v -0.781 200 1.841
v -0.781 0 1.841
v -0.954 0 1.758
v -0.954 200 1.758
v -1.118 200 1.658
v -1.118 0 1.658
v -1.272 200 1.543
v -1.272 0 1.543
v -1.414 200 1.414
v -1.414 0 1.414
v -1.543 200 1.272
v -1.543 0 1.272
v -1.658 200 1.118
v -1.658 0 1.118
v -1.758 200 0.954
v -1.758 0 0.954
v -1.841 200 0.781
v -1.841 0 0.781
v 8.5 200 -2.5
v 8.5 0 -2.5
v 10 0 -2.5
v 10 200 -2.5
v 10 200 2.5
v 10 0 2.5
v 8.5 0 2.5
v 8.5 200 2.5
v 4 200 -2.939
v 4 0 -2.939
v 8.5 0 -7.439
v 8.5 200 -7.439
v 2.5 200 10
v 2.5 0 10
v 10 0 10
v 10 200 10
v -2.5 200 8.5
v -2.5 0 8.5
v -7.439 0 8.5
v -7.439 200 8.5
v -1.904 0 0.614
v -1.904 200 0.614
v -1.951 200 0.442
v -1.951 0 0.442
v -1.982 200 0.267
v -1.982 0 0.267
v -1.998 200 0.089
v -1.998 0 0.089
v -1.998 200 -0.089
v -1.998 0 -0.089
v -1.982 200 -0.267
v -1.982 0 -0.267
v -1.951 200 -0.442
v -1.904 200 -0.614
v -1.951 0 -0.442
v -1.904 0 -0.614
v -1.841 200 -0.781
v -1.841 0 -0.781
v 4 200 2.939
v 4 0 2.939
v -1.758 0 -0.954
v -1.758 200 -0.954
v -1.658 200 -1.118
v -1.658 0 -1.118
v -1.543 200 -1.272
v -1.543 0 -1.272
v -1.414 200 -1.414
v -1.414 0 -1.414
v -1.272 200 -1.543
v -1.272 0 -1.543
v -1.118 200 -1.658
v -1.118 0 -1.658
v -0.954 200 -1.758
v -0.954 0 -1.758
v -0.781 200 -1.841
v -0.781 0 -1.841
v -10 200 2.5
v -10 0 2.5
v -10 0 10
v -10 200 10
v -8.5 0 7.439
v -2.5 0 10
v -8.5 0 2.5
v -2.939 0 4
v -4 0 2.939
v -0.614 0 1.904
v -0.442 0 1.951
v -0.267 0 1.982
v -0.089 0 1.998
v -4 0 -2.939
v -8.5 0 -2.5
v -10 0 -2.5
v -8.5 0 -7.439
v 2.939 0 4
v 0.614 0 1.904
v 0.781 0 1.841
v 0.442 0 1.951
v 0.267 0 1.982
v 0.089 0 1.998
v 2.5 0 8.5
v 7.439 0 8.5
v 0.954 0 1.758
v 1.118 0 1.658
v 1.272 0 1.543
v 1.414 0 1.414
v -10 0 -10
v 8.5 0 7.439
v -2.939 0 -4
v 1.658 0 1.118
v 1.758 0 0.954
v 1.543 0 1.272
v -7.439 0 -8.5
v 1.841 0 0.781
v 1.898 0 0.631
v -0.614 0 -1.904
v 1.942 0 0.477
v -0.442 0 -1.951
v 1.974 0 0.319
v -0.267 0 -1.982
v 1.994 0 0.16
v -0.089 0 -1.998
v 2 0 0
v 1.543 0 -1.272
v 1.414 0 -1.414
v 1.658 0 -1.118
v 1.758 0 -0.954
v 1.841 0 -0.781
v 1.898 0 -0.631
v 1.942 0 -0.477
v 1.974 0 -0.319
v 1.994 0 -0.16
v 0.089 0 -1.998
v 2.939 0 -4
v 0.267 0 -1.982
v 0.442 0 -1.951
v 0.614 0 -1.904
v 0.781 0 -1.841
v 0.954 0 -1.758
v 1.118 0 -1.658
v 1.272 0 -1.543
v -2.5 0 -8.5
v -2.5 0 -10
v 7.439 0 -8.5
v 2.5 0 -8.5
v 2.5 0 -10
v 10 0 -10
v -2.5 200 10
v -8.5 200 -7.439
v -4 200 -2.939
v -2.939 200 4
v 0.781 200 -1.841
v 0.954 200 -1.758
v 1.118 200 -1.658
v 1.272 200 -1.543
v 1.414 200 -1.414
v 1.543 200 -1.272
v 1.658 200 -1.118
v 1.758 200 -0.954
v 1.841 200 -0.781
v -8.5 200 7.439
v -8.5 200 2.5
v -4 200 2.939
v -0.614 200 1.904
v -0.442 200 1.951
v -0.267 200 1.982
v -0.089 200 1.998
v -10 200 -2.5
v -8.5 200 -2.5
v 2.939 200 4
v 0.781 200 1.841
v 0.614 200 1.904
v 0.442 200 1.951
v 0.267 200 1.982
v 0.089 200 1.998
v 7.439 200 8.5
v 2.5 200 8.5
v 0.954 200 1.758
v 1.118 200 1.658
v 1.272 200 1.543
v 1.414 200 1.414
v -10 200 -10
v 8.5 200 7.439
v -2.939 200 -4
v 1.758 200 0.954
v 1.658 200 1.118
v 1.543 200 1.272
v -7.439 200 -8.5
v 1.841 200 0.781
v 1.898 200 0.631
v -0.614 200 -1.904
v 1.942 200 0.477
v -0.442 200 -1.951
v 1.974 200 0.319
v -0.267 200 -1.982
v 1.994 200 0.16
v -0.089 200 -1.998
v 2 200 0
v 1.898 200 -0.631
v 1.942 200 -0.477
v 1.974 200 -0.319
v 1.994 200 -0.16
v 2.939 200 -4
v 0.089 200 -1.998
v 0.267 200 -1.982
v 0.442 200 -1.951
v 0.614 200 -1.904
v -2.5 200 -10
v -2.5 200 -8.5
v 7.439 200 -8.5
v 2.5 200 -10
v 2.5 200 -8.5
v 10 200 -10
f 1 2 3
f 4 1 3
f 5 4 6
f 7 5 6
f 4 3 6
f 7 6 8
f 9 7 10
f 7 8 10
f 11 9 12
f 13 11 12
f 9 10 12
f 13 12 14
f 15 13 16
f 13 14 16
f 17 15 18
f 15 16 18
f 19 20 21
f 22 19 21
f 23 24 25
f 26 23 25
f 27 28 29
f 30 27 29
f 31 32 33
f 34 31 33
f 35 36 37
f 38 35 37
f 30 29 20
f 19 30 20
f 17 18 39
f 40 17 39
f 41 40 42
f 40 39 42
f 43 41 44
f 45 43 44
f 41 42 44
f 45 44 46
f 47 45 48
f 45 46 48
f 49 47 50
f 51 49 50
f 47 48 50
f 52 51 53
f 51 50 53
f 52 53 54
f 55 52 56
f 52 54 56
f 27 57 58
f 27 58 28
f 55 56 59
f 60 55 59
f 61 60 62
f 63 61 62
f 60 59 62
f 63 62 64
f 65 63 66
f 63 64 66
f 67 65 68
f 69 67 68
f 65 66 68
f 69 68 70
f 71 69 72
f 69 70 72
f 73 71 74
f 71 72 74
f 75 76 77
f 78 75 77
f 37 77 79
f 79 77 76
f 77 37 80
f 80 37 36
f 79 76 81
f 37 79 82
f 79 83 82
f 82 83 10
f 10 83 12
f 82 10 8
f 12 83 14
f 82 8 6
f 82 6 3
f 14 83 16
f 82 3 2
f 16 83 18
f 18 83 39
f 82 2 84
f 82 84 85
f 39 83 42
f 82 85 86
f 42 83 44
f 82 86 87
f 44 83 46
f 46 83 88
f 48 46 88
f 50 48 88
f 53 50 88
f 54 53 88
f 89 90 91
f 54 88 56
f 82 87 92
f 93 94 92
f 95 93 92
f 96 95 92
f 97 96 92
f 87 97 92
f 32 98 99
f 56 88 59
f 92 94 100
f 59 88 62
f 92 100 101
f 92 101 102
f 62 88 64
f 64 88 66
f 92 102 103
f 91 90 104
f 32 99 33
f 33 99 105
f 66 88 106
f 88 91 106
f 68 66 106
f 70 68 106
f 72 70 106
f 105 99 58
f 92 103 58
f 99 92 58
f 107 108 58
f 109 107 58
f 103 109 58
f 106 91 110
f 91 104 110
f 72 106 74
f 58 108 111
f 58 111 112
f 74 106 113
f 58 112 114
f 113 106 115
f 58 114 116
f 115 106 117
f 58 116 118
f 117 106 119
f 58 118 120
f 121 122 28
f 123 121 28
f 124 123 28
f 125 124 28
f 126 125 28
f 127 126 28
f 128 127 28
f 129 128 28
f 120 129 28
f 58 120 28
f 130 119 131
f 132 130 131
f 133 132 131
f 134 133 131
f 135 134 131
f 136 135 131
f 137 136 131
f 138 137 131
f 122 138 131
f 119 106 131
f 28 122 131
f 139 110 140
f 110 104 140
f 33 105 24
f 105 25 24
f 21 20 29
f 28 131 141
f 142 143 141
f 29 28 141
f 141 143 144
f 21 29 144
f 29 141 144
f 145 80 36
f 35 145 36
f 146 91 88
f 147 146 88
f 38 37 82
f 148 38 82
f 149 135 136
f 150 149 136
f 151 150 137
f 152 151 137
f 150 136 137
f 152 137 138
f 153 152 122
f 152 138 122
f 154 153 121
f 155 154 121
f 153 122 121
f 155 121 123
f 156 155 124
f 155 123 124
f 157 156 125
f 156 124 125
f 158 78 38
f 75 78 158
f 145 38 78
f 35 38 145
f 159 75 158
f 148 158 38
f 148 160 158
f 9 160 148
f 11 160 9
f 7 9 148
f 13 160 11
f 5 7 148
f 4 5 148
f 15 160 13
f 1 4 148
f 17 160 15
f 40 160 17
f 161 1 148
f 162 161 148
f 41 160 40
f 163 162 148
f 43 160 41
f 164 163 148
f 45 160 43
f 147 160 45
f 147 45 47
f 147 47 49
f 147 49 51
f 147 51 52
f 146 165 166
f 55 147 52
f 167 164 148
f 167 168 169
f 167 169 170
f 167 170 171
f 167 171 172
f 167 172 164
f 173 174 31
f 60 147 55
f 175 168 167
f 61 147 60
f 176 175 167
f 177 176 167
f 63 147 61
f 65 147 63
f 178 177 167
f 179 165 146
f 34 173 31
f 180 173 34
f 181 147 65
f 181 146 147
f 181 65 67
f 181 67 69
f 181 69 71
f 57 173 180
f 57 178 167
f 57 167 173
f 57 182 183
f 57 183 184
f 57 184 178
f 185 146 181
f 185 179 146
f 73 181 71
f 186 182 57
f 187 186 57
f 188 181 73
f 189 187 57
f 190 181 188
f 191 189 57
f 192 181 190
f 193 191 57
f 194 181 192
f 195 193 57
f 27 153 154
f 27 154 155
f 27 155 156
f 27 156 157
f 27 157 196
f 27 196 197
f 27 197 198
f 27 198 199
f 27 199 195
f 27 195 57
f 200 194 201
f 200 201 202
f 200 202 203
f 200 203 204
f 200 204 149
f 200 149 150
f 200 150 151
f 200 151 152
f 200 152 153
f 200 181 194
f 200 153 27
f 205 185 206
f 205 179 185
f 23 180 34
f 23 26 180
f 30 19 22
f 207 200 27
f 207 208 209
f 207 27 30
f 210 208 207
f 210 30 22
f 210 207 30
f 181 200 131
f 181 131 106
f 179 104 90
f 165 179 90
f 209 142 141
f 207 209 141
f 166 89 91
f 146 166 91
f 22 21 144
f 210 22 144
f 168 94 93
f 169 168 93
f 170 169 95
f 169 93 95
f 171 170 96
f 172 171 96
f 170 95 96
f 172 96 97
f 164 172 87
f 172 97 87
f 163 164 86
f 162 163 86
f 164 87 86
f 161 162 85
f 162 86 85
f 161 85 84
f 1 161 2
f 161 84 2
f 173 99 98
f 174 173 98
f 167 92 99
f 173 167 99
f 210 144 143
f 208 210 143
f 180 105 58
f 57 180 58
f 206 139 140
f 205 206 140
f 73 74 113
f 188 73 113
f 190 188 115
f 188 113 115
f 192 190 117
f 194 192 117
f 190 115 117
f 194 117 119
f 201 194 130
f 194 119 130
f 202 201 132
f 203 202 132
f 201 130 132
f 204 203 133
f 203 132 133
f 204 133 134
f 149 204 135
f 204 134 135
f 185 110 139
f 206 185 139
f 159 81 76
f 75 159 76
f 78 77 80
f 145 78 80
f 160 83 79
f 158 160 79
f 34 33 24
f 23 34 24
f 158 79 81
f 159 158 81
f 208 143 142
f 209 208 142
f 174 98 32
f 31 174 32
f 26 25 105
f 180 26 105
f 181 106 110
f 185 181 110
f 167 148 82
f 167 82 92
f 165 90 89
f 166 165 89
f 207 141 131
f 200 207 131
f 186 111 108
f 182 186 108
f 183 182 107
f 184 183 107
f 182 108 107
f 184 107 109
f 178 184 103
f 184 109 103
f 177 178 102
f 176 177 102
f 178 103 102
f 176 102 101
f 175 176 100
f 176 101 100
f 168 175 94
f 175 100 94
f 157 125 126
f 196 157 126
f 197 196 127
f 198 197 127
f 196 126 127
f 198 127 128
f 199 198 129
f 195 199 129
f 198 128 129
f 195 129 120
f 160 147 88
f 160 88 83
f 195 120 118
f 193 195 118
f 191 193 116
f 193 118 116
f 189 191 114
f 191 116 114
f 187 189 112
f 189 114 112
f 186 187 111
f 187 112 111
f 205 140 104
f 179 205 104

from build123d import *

# Parameters (mm, degrees)
DODANIE_WYCI_GNI_CIE1_DEPTH = 200


with BuildPart() as part:
    # Szkic1 → Dodanie-wyciągnięcie1 (new body)
    with BuildSketch(Plane(origin=(0, 0, 0), x_dir=(1, 0, 0), z_dir=(0, 1, 0))):
        Polygon((9.560660172, 8.5), (8.5, 7.439339828), (8.5, 2.5), (10, 2.5), (10, 8.5), align=None)
        Polygon((-8.5, 9.560660172), (-7.439339828, 8.5), (-2.5, 8.5), (-2.5, 10), (-8.5, 10), align=None)
        Polygon((-8.939339828, 10), (-8.5, 9.560660172), (-8.5, 10), align=None)
        Polygon((-10, 10), (-10, 8.939339828), (-9.560660172, 8.5), (-8.5, 8.5), (-8.5, 9.560660172), (-8.939339828, 10), align=None)
        Polygon((-10, 8.939339828), (-10, 8.5), (-9.560660172, 8.5), align=None)
        Polygon((-10, 8.5), (-10, 2.5), (-8.5, 2.5), (-8.5, 7.439339828), (-9.560660172, 8.5), align=None)
        Polygon((-9.560660172, 8.5), (-8.5, 7.439339828), (-8.5, 8.5), align=None)
        Polygon((-8.5, 9.560660172), (-8.5, 8.5), (-7.439339828, 8.5), align=None)
        Polygon((-8.5, 7.439339828), (-4, 2.939339828), (-4, 4), (-2.939339828, 4), (-7.439339828, 8.5), (-8.5, 8.5), align=None)
        Polygon((-10, -10), (-8.939339828, -10), (-8.5, -9.560660172), (-8.5, -8.5), (-9.560660172, -8.5), (-10, -8.939339828), align=None)
        Polygon((-10, -8.5), (-10, -8.939339828), (-9.560660172, -8.5), align=None)
        Polygon((-10, -2.5), (-10, -8.5), (-9.560660172, -8.5), (-8.5, -7.439339828), (-8.5, -2.5), align=None)
        Polygon((-9.560660172, -8.5), (-8.5, -8.5), (-8.5, -7.439339828), align=None)
        Polygon((-8.5, -8.5), (-8.5, -9.560660172), (-7.439339828, -8.5), align=None)
        Polygon((-8.5, -9.560660172), (-8.939339828, -10), (-8.5, -10), align=None)
        Polygon((-7.439339828, -8.5), (-8.5, -9.560660172), (-8.5, -10), (-2.5, -10), (-2.5, -8.5), align=None)
        Polygon((-8.5, -8.5), (-7.439339828, -8.5), (-2.939339828, -4), (-4, -4), (-4, -2.939339828), (-8.5, -7.439339828), align=None)
        with BuildLine():
            Line((-2.939339828, 4), (-0.780680974, 1.841341146))
            ThreePointArc((-0.780680974, 1.841341146), (0, 2), (0.780680974, 1.841341146))
            Line((0.780680974, 1.841341146), (2.939339828, 4))
            Line((2.939339828, 4), (-2.939339828, 4))
        make_face()
        with BuildLine():
            Line((-4, 4), (-4, 2.939339828))
            Line((-4, 2.939339828), (-1.841341146, 0.780680974))
            ThreePointArc((-1.841341146, 0.780680974), (-1.414213562, 1.414213562), (-0.780680974, 1.841341146))
            Line((-0.780680974, 1.841341146), (-2.939339828, 4))
            Line((-2.939339828, 4), (-4, 4))
        make_face()
        with BuildLine():
            Line((-4, 2.939339828), (-4, -2.939339828))
            Line((-4, -2.939339828), (-1.841341146, -0.780680974))
            ThreePointArc((-1.841341146, -0.780680974), (-2, 0), (-1.841341146, 0.780680974))
            Line((-1.841341146, 0.780680974), (-4, 2.939339828))
        make_face()
        with BuildLine():
            Line((-4, -4), (-2.939339828, -4))
            Line((-2.939339828, -4), (-0.780680974, -1.841341146))
            ThreePointArc((-0.780680974, -1.841341146), (-1.414213562, -1.414213562), (-1.841341146, -0.780680974))
            Line((-1.841341146, -0.780680974), (-4, -2.939339828))
            Line((-4, -2.939339828), (-4, -4))
        make_face()
        with BuildLine():
            Line((-0.780680974, -1.841341146), (-2.939339828, -4))
            Line((-2.939339828, -4), (2.939339828, -4))
            Line((2.939339828, -4), (0.780680974, -1.841341146))
            ThreePointArc((0.780680974, -1.841341146), (0, -2), (-0.780680974, -1.841341146))
        make_face()
        with BuildLine():
            Line((0.780680974, -1.841341146), (2.939339828, -4))
            Line((2.939339828, -4), (4, -4))
            Line((4, -4), (4, -2.939339828))
            Line((4, -2.939339828), (1.841341146, -0.780680974))
            ThreePointArc((1.841341146, -0.780680974), (1.414213562, -1.414213562), (0.780680974, -1.841341146))
        make_face()
        with BuildLine():
            ThreePointArc((2, 0), (1.959933965, -0.39832004), (1.841341146, -0.780680974))
            Line((1.841341146, -0.780680974), (4, -2.939339828))
            Line((4, -2.939339828), (4, 2.939339828))
            Line((4, 2.939339828), (1.841341146, 0.780680974))
            ThreePointArc((1.841341146, 0.780680974), (1.959933965, 0.39832004), (2, 0))
        make_face()
        with BuildLine():
            ThreePointArc((0.780680974, 1.841341146), (1.414213562, 1.414213562), (1.841341146, 0.780680974))
            Line((1.841341146, 0.780680974), (4, 2.939339828))
            Line((4, 2.939339828), (4, 4))
            Line((4, 4), (2.939339828, 4))
            Line((2.939339828, 4), (0.780680974, 1.841341146))
        make_face()
        Polygon((2.5, 8.5), (7.439339828, 8.5), (8.5, 9.560660172), (8.5, 10), (2.5, 10), align=None)
        Polygon((7.439339828, 8.5), (8.5, 8.5), (8.5, 9.560660172), align=None)
        Polygon((8.5, 10), (8.5, 9.560660172), (8.939339828, 10), align=None)
        Polygon((8.5, 8.5), (9.560660172, 8.5), (10, 8.939339828), (10, 10), (8.939339828, 10), (8.5, 9.560660172), align=None)
        Polygon((8.5, 8.5), (8.5, 7.439339828), (9.560660172, 8.5), align=None)
        Polygon((10, 8.939339828), (9.560660172, 8.5), (10, 8.5), align=None)
        Polygon((4, 4), (4, 2.939339828), (8.5, 7.439339828), (8.5, 8.5), (7.439339828, 8.5), (2.939339828, 4), align=None)
        Polygon((4, -4), (2.939339828, -4), (7.439339828, -8.5), (8.5, -8.5), (8.5, -7.439339828), (4, -2.939339828), align=None)
        Polygon((8.5, -8.5), (7.439339828, -8.5), (8.5, -9.560660172), align=None)
        Polygon((8.5, -7.439339828), (8.5, -8.5), (9.560660172, -8.5), align=None)
        Polygon((8.5, -2.5), (8.5, -7.439339828), (9.560660172, -8.5), (10, -8.5), (10, -2.5), align=None)
        Polygon((2.5, -8.5), (2.5, -10), (8.5, -10), (8.5, -9.560660172), (7.439339828, -8.5), align=None)
        Polygon((8.5, -9.560660172), (8.939339828, -10), (10, -10), (10, -8.939339828), (9.560660172, -8.5), (8.5, -8.5), align=None)
        Polygon((8.5, -9.560660172), (8.5, -10), (8.939339828, -10), align=None)
        Polygon((10, -8.5), (9.560660172, -8.5), (10, -8.939339828), align=None)
    extrude(amount=DODANIE_WYCI_GNI_CIE1_DEPTH)


solid = part.part
